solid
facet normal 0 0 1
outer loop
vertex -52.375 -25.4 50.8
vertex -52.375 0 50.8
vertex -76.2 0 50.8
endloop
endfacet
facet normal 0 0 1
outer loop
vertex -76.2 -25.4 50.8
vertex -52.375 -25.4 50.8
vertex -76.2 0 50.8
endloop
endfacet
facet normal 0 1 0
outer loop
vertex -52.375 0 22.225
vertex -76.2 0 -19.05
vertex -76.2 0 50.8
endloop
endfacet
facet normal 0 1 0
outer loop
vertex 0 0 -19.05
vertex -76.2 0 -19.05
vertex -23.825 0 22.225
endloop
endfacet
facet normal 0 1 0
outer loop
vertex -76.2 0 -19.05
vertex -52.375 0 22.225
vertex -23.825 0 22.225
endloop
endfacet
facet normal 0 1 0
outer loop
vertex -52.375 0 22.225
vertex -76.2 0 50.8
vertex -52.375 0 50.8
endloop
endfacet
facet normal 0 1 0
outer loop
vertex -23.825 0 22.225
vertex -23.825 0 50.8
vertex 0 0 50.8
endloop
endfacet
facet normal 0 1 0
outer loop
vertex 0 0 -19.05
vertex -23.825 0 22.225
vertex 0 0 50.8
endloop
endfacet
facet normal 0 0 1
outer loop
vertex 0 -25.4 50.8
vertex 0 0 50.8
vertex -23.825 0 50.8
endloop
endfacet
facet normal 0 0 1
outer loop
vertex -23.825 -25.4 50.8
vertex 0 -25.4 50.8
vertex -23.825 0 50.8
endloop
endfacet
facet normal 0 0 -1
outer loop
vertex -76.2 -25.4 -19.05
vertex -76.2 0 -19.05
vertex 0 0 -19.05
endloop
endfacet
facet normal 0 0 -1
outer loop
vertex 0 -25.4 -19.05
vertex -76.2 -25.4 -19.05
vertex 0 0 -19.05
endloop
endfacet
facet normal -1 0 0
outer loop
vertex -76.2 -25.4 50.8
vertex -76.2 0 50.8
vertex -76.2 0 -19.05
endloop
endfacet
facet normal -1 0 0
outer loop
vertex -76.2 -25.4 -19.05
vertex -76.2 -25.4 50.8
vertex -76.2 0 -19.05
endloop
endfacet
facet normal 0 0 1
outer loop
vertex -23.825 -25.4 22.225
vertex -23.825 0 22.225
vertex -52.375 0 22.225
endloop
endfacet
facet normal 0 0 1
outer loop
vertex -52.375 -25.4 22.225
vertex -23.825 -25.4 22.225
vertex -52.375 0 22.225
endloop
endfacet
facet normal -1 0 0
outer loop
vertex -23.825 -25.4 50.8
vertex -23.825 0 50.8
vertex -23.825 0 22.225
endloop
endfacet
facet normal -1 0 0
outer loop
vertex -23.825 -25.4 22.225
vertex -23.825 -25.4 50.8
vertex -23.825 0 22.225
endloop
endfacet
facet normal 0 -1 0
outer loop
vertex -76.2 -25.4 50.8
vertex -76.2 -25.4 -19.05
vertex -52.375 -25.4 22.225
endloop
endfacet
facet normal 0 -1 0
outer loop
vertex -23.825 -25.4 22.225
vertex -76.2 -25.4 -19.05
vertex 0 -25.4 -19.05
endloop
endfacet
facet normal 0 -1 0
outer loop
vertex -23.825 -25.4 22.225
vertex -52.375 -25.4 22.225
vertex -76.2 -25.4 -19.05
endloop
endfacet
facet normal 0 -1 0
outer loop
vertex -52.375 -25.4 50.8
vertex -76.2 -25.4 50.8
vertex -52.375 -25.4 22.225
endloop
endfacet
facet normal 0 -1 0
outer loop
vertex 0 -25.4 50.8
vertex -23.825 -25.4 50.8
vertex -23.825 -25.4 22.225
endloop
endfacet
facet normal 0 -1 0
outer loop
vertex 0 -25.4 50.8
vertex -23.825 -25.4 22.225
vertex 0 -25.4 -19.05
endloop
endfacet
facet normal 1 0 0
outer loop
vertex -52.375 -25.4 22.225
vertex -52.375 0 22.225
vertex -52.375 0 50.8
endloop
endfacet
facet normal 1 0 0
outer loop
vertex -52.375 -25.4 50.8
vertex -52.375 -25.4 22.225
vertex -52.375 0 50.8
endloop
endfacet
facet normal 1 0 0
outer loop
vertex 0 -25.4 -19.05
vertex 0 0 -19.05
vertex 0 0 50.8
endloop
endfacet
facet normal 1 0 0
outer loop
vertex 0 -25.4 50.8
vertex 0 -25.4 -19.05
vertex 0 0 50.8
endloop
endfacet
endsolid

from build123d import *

# Parameters (mm, degrees)
F1_DEPTH = 25.4


with BuildPart() as f1:
    # F0 (on Front) → F1 (new body)
    with BuildSketch(Plane.XZ):
        Polygon((-23.8252, 0), (0, 0), (0, 50.8), (-23.8252, 50.8), (-23.8252, 22.225), (-52.3748, 22.225), (-52.3748, 50.8), (-76.2, 50.8), (-76.2, 0), (-52.3748, 0), align=None)
        Polygon((0, -19.05), (0, 0), (-23.8252, 0), (-52.3748, 0), (-76.2, 0), (-76.2, -19.05), align=None)
    extrude(amount=F1_DEPTH)


solid = f1.part
